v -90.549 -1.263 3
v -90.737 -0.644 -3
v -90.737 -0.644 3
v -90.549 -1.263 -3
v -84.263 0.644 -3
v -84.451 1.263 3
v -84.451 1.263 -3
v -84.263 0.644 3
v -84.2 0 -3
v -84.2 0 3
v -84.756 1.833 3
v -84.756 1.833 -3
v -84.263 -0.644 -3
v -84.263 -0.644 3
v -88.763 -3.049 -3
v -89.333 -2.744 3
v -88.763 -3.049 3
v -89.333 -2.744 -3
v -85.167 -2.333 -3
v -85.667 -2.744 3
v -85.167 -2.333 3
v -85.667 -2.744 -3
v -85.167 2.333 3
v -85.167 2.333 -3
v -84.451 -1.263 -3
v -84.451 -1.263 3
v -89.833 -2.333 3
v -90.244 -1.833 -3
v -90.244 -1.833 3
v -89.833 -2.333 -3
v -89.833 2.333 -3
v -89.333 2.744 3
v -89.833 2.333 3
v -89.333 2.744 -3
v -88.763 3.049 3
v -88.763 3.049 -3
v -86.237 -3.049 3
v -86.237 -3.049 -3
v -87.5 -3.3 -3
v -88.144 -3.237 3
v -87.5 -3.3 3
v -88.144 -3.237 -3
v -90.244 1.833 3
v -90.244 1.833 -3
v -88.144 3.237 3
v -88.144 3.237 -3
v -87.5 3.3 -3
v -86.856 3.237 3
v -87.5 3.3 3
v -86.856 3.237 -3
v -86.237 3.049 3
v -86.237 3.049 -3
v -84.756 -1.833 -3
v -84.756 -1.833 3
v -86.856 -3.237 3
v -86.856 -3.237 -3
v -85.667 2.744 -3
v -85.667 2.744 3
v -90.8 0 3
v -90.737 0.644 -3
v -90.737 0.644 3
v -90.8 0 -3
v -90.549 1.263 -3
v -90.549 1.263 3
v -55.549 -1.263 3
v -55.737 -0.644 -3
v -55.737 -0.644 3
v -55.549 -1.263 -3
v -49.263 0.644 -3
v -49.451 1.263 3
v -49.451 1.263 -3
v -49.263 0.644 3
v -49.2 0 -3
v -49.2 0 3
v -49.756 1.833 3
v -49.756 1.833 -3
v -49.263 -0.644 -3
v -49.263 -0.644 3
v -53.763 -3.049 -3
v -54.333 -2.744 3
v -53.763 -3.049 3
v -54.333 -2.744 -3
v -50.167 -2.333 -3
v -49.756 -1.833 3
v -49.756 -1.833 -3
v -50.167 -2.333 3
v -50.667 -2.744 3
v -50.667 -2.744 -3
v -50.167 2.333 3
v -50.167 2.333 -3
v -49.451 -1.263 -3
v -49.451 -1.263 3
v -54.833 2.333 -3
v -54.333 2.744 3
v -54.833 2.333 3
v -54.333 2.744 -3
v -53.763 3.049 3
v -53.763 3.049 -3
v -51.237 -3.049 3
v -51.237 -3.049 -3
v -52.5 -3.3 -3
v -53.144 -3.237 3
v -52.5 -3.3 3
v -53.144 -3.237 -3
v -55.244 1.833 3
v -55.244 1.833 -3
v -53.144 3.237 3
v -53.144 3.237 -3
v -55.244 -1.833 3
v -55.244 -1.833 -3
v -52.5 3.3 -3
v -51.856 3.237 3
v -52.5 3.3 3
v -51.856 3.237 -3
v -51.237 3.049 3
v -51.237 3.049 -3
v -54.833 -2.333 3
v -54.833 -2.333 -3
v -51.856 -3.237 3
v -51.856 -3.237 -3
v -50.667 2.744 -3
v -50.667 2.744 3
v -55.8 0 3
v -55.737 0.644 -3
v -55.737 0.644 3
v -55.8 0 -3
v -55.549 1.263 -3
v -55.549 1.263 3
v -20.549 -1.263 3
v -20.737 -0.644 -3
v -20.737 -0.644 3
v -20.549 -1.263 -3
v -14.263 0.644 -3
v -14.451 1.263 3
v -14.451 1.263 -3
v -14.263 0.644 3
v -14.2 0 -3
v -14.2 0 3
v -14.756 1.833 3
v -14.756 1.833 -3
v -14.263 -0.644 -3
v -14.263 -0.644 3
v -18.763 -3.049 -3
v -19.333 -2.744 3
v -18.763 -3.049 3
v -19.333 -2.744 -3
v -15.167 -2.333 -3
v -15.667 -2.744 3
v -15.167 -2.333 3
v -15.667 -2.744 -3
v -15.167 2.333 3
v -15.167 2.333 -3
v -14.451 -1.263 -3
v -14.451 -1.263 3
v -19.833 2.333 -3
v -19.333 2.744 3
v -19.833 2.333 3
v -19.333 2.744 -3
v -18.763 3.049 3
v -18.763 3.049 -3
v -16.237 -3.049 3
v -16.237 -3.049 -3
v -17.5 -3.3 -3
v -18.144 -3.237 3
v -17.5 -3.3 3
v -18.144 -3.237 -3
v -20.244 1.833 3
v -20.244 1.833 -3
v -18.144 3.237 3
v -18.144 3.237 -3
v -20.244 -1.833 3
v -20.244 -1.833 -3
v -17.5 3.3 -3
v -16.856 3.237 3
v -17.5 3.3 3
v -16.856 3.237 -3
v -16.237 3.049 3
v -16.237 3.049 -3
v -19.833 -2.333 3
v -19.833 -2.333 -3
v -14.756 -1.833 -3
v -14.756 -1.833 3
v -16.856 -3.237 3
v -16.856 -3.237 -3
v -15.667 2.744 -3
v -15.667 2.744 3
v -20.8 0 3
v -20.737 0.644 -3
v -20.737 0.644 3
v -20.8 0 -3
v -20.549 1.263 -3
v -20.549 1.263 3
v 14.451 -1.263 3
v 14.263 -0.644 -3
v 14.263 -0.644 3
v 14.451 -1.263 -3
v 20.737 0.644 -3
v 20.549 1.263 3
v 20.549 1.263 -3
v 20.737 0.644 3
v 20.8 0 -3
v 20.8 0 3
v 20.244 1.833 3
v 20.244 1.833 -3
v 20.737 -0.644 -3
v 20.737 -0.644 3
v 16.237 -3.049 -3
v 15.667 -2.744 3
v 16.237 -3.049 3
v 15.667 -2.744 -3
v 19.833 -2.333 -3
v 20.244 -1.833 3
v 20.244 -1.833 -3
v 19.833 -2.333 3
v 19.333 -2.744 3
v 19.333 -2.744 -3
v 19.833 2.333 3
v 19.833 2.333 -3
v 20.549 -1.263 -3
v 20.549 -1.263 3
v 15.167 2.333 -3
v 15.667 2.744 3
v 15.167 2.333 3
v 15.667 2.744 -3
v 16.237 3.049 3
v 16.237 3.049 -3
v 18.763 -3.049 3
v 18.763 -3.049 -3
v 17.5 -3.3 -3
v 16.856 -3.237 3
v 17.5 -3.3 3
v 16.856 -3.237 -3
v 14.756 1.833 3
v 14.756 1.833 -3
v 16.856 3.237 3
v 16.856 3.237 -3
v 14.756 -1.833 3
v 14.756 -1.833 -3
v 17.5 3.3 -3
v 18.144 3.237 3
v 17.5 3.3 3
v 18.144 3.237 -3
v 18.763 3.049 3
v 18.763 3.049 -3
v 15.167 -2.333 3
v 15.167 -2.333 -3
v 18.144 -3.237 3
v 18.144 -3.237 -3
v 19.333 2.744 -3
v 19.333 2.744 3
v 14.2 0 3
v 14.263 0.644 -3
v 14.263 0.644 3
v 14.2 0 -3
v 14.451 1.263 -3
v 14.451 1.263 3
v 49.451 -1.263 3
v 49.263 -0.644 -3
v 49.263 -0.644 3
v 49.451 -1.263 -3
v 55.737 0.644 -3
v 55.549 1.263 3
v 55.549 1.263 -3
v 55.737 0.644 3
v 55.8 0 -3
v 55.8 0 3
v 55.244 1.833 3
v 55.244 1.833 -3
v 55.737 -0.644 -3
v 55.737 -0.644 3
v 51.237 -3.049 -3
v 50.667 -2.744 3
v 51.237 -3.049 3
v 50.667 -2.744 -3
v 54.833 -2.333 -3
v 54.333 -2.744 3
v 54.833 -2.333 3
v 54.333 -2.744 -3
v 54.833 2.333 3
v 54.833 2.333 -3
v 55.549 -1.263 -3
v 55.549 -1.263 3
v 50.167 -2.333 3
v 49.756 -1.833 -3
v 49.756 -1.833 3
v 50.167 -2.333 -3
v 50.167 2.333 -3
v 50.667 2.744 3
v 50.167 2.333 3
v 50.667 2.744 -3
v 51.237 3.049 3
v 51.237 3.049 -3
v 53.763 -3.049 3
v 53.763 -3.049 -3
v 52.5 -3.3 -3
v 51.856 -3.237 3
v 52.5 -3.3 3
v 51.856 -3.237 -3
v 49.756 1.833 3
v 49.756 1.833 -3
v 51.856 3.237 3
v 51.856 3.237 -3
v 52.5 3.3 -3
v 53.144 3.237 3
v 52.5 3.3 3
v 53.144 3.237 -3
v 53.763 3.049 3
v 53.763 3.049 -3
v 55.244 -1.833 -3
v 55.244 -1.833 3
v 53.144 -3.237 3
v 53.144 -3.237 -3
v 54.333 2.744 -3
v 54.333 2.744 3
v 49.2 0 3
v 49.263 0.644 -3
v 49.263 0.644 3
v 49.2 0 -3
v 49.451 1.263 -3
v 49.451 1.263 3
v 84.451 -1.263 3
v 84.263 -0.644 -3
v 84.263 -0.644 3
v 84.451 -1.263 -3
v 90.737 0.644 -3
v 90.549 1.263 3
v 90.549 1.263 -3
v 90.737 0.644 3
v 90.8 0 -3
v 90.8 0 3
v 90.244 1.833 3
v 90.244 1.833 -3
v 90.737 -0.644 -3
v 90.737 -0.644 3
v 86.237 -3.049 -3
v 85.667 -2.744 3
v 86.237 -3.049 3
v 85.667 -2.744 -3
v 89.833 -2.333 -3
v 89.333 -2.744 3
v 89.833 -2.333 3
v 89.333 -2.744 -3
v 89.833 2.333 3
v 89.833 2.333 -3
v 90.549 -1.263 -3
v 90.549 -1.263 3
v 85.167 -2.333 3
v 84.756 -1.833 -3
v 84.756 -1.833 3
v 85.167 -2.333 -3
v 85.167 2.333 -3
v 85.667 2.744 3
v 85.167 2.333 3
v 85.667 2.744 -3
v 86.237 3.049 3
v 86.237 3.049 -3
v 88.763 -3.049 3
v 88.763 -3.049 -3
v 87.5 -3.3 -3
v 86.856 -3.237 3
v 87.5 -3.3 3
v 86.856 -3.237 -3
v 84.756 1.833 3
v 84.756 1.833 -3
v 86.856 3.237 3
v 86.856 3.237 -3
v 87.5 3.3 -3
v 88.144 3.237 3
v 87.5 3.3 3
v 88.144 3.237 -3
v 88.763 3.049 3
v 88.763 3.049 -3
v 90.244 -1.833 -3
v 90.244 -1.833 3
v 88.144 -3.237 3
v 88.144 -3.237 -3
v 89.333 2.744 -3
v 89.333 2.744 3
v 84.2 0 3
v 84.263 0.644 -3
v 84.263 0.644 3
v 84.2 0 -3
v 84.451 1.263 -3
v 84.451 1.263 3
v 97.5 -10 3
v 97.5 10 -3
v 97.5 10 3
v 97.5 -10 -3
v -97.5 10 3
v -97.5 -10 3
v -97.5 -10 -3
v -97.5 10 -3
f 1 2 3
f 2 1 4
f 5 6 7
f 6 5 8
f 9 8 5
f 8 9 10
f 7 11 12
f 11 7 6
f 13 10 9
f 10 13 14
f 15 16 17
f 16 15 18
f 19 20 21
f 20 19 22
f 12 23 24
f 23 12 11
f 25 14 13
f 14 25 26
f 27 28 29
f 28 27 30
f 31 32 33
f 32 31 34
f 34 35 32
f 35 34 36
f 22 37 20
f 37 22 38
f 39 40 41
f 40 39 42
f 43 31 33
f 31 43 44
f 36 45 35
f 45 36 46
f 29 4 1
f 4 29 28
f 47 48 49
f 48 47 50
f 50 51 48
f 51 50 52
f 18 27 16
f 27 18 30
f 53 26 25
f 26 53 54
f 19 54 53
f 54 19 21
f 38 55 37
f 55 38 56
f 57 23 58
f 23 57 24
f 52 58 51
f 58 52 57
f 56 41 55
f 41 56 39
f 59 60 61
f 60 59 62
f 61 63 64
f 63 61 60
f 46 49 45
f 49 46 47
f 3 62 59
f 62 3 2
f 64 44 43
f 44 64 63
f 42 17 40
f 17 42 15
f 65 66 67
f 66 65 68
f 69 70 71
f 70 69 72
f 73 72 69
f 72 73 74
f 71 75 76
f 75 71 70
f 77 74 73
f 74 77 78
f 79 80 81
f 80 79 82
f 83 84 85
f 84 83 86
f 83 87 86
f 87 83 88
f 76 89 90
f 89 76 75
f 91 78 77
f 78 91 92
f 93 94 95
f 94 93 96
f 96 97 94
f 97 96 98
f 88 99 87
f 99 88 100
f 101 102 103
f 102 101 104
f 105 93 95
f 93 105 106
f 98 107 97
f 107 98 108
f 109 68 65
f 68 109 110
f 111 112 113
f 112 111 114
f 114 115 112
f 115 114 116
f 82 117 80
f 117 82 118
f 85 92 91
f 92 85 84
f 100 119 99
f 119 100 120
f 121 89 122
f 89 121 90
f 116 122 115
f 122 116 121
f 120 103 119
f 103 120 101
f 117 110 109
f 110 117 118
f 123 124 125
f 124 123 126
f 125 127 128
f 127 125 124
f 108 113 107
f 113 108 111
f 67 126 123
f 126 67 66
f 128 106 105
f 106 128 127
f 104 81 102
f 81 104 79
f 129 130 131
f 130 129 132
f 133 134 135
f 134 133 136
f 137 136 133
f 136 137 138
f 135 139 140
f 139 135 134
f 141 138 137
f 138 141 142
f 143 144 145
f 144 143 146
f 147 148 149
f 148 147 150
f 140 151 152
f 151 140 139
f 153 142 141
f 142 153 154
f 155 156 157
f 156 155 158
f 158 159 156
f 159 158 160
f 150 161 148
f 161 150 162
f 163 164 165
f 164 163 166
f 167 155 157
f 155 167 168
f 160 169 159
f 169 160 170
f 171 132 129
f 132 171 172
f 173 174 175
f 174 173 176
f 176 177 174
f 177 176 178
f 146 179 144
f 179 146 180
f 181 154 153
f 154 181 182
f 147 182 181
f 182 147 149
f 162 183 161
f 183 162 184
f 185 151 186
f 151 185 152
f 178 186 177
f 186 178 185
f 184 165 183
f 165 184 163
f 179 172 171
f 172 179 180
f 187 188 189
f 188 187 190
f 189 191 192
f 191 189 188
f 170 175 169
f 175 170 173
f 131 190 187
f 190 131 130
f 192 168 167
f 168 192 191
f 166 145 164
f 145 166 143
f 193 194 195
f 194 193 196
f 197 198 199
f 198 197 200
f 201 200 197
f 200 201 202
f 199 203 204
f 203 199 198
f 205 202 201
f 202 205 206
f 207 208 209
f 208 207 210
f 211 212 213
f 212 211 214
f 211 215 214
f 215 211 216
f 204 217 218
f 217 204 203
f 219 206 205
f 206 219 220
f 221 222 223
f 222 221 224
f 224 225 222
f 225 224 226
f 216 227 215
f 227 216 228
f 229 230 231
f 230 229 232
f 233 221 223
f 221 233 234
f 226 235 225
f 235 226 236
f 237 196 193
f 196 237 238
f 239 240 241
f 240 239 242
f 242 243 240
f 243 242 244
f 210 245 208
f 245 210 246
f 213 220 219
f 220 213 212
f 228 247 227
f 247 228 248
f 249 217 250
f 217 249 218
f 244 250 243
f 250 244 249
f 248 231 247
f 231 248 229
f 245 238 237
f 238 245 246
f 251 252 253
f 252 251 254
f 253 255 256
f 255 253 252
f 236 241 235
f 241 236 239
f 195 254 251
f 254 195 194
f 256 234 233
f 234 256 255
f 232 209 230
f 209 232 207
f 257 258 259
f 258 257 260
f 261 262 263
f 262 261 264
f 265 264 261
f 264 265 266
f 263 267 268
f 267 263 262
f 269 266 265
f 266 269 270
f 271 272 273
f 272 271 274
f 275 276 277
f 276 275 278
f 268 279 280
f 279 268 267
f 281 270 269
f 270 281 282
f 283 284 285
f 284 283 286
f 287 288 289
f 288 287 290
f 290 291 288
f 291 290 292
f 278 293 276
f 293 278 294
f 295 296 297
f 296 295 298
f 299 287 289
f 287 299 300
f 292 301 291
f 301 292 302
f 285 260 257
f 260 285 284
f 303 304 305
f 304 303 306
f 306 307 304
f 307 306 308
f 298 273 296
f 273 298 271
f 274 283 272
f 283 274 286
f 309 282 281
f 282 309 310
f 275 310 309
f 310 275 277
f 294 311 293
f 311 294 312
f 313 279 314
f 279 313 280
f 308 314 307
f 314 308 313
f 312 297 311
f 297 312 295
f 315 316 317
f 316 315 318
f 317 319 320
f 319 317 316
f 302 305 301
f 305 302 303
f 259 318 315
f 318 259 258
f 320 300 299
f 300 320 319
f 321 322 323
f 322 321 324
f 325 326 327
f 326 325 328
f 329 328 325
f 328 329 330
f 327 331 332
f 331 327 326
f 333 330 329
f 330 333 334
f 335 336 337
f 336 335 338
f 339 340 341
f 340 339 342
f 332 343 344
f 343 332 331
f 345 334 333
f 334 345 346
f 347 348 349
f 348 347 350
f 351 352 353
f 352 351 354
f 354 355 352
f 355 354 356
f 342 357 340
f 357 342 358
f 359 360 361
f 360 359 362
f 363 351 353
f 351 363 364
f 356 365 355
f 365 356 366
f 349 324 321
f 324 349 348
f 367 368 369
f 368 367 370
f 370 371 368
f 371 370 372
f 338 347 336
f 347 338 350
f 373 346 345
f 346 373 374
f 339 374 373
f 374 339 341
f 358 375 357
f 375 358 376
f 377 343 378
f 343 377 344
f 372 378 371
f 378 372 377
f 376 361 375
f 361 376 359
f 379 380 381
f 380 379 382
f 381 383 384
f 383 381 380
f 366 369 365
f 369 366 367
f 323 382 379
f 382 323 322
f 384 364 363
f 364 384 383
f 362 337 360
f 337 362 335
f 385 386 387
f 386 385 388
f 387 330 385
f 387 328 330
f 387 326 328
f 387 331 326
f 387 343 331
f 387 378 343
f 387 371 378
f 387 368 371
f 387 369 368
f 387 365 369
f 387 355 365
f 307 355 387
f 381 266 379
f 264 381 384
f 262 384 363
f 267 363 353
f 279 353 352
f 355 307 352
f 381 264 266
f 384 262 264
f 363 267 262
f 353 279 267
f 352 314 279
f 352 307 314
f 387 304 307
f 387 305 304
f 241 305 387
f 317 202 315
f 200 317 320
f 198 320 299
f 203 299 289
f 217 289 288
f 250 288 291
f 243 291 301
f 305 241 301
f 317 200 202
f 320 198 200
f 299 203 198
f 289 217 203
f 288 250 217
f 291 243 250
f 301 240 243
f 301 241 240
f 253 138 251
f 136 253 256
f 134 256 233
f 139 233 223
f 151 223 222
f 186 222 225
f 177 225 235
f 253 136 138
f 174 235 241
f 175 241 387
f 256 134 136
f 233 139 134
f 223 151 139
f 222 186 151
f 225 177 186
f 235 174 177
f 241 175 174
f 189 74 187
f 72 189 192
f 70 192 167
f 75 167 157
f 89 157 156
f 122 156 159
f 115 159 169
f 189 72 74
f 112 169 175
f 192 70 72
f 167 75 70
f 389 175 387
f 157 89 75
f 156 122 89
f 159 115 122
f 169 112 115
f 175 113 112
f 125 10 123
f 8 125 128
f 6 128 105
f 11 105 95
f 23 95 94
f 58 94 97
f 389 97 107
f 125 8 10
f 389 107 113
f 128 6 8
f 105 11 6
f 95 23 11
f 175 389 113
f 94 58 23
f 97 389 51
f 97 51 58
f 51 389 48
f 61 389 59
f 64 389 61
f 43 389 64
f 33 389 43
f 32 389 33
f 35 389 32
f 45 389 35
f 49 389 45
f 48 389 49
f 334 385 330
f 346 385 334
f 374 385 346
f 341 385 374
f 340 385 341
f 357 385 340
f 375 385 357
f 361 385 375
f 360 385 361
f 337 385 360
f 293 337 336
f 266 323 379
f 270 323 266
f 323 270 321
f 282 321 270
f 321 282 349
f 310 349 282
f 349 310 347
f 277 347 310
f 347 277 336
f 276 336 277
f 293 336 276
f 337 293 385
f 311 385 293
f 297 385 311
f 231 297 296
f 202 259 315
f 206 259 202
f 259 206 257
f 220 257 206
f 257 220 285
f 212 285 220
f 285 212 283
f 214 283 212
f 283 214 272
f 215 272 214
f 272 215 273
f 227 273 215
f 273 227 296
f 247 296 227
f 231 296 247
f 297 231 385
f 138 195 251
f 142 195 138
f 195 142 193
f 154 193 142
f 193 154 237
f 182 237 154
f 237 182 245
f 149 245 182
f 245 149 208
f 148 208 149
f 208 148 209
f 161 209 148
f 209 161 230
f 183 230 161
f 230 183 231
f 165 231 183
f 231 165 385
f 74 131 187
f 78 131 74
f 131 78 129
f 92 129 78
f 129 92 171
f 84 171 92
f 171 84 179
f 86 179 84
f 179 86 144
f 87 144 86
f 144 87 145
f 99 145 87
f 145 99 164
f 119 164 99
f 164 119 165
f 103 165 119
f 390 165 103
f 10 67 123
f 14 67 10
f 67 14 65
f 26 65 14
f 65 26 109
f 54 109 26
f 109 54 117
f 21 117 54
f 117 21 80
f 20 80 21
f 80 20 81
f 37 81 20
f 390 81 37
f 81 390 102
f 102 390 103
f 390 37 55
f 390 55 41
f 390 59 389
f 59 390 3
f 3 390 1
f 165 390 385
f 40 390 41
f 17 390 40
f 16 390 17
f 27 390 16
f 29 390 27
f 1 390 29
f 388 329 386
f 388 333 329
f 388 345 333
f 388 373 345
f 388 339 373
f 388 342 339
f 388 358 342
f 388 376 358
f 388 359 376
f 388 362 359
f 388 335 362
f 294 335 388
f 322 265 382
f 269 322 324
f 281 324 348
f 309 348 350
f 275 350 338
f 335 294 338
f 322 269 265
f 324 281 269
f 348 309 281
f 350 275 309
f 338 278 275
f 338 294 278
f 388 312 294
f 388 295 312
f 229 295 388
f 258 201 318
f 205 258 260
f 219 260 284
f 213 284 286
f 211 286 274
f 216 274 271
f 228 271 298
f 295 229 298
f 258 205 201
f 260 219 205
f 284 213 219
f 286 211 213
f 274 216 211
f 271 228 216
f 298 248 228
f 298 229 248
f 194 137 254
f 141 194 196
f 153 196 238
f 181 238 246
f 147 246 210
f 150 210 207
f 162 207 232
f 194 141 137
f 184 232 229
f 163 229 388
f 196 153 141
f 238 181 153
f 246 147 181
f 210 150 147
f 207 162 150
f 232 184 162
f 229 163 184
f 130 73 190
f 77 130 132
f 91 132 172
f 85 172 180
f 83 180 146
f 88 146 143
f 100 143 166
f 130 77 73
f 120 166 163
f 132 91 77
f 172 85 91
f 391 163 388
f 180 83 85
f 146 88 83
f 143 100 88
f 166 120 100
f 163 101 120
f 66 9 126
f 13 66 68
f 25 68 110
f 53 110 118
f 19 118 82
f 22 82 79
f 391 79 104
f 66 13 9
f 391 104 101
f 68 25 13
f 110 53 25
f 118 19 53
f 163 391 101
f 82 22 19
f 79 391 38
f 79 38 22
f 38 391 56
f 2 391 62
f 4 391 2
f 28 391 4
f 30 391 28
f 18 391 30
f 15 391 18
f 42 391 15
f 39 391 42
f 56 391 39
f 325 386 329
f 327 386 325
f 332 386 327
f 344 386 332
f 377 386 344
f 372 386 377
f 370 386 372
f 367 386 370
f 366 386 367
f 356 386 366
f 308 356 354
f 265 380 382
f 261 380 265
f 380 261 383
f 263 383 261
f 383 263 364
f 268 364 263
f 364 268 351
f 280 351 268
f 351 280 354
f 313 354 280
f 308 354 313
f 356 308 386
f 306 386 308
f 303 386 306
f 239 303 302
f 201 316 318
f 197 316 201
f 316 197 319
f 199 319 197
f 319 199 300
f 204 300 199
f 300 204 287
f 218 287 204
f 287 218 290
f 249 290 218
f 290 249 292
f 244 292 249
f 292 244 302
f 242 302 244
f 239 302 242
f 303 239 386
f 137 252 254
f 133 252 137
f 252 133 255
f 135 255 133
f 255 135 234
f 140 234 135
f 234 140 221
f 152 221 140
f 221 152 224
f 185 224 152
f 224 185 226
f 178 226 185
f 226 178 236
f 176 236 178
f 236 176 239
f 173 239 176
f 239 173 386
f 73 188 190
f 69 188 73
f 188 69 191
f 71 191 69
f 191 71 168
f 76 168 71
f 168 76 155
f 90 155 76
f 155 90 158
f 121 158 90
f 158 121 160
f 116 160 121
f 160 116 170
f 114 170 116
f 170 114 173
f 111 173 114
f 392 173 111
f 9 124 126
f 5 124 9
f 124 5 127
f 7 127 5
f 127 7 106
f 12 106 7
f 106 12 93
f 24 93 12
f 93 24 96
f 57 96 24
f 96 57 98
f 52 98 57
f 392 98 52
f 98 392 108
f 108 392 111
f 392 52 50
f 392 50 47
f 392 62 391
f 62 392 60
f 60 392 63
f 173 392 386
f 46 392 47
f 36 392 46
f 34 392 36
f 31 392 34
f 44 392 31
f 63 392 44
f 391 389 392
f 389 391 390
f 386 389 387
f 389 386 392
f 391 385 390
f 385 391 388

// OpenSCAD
$fn = 32;

// ----------------------------------------------------------------------
// Hole bar, 6 x Ø6.6
// row layout, 10 mm edge offset
// ----------------------------------------------------------------------

// --- parameters (mm) ---
bar_w = 20;    // bar width (Y)
bar_t = 6;     // bar thickness (Z)
holes = 6;     // holes per row
hole_d = 6.6;  // hole diameter
edge = 10;     // offset from the bar end to the first hole
pitch = 35;    // pitch between neighbouring holes

// --- derived feature positions (mm) ---
span = (holes - 1) * pitch;   // = 175   distance between the end holes
bar_l = span + 2 * edge;      // = 195   overall bar length
start_x = -bar_l / 2 + edge;  // = -87.5   X of the first hole
feature_centers = [
  [start_x + 0 * pitch, 0],
  [start_x + 1 * pitch, 0],
  [start_x + 2 * pitch, 0],
  [start_x + 3 * pitch, 0],
  [start_x + 4 * pitch, 0],
  [start_x + 5 * pitch, 0]
];   // hole centres of the first row

// bar with one row of holes, drilled from feature_centers
difference() {
  translate([-bar_l / 2, -bar_w / 2, -bar_t / 2]) cube([bar_l, bar_w, bar_t]);
  for (centre = feature_centers)
    translate([centre[0], centre[1], 0])
      cylinder(d = hole_d, h = bar_t + 2, center = true);
}
